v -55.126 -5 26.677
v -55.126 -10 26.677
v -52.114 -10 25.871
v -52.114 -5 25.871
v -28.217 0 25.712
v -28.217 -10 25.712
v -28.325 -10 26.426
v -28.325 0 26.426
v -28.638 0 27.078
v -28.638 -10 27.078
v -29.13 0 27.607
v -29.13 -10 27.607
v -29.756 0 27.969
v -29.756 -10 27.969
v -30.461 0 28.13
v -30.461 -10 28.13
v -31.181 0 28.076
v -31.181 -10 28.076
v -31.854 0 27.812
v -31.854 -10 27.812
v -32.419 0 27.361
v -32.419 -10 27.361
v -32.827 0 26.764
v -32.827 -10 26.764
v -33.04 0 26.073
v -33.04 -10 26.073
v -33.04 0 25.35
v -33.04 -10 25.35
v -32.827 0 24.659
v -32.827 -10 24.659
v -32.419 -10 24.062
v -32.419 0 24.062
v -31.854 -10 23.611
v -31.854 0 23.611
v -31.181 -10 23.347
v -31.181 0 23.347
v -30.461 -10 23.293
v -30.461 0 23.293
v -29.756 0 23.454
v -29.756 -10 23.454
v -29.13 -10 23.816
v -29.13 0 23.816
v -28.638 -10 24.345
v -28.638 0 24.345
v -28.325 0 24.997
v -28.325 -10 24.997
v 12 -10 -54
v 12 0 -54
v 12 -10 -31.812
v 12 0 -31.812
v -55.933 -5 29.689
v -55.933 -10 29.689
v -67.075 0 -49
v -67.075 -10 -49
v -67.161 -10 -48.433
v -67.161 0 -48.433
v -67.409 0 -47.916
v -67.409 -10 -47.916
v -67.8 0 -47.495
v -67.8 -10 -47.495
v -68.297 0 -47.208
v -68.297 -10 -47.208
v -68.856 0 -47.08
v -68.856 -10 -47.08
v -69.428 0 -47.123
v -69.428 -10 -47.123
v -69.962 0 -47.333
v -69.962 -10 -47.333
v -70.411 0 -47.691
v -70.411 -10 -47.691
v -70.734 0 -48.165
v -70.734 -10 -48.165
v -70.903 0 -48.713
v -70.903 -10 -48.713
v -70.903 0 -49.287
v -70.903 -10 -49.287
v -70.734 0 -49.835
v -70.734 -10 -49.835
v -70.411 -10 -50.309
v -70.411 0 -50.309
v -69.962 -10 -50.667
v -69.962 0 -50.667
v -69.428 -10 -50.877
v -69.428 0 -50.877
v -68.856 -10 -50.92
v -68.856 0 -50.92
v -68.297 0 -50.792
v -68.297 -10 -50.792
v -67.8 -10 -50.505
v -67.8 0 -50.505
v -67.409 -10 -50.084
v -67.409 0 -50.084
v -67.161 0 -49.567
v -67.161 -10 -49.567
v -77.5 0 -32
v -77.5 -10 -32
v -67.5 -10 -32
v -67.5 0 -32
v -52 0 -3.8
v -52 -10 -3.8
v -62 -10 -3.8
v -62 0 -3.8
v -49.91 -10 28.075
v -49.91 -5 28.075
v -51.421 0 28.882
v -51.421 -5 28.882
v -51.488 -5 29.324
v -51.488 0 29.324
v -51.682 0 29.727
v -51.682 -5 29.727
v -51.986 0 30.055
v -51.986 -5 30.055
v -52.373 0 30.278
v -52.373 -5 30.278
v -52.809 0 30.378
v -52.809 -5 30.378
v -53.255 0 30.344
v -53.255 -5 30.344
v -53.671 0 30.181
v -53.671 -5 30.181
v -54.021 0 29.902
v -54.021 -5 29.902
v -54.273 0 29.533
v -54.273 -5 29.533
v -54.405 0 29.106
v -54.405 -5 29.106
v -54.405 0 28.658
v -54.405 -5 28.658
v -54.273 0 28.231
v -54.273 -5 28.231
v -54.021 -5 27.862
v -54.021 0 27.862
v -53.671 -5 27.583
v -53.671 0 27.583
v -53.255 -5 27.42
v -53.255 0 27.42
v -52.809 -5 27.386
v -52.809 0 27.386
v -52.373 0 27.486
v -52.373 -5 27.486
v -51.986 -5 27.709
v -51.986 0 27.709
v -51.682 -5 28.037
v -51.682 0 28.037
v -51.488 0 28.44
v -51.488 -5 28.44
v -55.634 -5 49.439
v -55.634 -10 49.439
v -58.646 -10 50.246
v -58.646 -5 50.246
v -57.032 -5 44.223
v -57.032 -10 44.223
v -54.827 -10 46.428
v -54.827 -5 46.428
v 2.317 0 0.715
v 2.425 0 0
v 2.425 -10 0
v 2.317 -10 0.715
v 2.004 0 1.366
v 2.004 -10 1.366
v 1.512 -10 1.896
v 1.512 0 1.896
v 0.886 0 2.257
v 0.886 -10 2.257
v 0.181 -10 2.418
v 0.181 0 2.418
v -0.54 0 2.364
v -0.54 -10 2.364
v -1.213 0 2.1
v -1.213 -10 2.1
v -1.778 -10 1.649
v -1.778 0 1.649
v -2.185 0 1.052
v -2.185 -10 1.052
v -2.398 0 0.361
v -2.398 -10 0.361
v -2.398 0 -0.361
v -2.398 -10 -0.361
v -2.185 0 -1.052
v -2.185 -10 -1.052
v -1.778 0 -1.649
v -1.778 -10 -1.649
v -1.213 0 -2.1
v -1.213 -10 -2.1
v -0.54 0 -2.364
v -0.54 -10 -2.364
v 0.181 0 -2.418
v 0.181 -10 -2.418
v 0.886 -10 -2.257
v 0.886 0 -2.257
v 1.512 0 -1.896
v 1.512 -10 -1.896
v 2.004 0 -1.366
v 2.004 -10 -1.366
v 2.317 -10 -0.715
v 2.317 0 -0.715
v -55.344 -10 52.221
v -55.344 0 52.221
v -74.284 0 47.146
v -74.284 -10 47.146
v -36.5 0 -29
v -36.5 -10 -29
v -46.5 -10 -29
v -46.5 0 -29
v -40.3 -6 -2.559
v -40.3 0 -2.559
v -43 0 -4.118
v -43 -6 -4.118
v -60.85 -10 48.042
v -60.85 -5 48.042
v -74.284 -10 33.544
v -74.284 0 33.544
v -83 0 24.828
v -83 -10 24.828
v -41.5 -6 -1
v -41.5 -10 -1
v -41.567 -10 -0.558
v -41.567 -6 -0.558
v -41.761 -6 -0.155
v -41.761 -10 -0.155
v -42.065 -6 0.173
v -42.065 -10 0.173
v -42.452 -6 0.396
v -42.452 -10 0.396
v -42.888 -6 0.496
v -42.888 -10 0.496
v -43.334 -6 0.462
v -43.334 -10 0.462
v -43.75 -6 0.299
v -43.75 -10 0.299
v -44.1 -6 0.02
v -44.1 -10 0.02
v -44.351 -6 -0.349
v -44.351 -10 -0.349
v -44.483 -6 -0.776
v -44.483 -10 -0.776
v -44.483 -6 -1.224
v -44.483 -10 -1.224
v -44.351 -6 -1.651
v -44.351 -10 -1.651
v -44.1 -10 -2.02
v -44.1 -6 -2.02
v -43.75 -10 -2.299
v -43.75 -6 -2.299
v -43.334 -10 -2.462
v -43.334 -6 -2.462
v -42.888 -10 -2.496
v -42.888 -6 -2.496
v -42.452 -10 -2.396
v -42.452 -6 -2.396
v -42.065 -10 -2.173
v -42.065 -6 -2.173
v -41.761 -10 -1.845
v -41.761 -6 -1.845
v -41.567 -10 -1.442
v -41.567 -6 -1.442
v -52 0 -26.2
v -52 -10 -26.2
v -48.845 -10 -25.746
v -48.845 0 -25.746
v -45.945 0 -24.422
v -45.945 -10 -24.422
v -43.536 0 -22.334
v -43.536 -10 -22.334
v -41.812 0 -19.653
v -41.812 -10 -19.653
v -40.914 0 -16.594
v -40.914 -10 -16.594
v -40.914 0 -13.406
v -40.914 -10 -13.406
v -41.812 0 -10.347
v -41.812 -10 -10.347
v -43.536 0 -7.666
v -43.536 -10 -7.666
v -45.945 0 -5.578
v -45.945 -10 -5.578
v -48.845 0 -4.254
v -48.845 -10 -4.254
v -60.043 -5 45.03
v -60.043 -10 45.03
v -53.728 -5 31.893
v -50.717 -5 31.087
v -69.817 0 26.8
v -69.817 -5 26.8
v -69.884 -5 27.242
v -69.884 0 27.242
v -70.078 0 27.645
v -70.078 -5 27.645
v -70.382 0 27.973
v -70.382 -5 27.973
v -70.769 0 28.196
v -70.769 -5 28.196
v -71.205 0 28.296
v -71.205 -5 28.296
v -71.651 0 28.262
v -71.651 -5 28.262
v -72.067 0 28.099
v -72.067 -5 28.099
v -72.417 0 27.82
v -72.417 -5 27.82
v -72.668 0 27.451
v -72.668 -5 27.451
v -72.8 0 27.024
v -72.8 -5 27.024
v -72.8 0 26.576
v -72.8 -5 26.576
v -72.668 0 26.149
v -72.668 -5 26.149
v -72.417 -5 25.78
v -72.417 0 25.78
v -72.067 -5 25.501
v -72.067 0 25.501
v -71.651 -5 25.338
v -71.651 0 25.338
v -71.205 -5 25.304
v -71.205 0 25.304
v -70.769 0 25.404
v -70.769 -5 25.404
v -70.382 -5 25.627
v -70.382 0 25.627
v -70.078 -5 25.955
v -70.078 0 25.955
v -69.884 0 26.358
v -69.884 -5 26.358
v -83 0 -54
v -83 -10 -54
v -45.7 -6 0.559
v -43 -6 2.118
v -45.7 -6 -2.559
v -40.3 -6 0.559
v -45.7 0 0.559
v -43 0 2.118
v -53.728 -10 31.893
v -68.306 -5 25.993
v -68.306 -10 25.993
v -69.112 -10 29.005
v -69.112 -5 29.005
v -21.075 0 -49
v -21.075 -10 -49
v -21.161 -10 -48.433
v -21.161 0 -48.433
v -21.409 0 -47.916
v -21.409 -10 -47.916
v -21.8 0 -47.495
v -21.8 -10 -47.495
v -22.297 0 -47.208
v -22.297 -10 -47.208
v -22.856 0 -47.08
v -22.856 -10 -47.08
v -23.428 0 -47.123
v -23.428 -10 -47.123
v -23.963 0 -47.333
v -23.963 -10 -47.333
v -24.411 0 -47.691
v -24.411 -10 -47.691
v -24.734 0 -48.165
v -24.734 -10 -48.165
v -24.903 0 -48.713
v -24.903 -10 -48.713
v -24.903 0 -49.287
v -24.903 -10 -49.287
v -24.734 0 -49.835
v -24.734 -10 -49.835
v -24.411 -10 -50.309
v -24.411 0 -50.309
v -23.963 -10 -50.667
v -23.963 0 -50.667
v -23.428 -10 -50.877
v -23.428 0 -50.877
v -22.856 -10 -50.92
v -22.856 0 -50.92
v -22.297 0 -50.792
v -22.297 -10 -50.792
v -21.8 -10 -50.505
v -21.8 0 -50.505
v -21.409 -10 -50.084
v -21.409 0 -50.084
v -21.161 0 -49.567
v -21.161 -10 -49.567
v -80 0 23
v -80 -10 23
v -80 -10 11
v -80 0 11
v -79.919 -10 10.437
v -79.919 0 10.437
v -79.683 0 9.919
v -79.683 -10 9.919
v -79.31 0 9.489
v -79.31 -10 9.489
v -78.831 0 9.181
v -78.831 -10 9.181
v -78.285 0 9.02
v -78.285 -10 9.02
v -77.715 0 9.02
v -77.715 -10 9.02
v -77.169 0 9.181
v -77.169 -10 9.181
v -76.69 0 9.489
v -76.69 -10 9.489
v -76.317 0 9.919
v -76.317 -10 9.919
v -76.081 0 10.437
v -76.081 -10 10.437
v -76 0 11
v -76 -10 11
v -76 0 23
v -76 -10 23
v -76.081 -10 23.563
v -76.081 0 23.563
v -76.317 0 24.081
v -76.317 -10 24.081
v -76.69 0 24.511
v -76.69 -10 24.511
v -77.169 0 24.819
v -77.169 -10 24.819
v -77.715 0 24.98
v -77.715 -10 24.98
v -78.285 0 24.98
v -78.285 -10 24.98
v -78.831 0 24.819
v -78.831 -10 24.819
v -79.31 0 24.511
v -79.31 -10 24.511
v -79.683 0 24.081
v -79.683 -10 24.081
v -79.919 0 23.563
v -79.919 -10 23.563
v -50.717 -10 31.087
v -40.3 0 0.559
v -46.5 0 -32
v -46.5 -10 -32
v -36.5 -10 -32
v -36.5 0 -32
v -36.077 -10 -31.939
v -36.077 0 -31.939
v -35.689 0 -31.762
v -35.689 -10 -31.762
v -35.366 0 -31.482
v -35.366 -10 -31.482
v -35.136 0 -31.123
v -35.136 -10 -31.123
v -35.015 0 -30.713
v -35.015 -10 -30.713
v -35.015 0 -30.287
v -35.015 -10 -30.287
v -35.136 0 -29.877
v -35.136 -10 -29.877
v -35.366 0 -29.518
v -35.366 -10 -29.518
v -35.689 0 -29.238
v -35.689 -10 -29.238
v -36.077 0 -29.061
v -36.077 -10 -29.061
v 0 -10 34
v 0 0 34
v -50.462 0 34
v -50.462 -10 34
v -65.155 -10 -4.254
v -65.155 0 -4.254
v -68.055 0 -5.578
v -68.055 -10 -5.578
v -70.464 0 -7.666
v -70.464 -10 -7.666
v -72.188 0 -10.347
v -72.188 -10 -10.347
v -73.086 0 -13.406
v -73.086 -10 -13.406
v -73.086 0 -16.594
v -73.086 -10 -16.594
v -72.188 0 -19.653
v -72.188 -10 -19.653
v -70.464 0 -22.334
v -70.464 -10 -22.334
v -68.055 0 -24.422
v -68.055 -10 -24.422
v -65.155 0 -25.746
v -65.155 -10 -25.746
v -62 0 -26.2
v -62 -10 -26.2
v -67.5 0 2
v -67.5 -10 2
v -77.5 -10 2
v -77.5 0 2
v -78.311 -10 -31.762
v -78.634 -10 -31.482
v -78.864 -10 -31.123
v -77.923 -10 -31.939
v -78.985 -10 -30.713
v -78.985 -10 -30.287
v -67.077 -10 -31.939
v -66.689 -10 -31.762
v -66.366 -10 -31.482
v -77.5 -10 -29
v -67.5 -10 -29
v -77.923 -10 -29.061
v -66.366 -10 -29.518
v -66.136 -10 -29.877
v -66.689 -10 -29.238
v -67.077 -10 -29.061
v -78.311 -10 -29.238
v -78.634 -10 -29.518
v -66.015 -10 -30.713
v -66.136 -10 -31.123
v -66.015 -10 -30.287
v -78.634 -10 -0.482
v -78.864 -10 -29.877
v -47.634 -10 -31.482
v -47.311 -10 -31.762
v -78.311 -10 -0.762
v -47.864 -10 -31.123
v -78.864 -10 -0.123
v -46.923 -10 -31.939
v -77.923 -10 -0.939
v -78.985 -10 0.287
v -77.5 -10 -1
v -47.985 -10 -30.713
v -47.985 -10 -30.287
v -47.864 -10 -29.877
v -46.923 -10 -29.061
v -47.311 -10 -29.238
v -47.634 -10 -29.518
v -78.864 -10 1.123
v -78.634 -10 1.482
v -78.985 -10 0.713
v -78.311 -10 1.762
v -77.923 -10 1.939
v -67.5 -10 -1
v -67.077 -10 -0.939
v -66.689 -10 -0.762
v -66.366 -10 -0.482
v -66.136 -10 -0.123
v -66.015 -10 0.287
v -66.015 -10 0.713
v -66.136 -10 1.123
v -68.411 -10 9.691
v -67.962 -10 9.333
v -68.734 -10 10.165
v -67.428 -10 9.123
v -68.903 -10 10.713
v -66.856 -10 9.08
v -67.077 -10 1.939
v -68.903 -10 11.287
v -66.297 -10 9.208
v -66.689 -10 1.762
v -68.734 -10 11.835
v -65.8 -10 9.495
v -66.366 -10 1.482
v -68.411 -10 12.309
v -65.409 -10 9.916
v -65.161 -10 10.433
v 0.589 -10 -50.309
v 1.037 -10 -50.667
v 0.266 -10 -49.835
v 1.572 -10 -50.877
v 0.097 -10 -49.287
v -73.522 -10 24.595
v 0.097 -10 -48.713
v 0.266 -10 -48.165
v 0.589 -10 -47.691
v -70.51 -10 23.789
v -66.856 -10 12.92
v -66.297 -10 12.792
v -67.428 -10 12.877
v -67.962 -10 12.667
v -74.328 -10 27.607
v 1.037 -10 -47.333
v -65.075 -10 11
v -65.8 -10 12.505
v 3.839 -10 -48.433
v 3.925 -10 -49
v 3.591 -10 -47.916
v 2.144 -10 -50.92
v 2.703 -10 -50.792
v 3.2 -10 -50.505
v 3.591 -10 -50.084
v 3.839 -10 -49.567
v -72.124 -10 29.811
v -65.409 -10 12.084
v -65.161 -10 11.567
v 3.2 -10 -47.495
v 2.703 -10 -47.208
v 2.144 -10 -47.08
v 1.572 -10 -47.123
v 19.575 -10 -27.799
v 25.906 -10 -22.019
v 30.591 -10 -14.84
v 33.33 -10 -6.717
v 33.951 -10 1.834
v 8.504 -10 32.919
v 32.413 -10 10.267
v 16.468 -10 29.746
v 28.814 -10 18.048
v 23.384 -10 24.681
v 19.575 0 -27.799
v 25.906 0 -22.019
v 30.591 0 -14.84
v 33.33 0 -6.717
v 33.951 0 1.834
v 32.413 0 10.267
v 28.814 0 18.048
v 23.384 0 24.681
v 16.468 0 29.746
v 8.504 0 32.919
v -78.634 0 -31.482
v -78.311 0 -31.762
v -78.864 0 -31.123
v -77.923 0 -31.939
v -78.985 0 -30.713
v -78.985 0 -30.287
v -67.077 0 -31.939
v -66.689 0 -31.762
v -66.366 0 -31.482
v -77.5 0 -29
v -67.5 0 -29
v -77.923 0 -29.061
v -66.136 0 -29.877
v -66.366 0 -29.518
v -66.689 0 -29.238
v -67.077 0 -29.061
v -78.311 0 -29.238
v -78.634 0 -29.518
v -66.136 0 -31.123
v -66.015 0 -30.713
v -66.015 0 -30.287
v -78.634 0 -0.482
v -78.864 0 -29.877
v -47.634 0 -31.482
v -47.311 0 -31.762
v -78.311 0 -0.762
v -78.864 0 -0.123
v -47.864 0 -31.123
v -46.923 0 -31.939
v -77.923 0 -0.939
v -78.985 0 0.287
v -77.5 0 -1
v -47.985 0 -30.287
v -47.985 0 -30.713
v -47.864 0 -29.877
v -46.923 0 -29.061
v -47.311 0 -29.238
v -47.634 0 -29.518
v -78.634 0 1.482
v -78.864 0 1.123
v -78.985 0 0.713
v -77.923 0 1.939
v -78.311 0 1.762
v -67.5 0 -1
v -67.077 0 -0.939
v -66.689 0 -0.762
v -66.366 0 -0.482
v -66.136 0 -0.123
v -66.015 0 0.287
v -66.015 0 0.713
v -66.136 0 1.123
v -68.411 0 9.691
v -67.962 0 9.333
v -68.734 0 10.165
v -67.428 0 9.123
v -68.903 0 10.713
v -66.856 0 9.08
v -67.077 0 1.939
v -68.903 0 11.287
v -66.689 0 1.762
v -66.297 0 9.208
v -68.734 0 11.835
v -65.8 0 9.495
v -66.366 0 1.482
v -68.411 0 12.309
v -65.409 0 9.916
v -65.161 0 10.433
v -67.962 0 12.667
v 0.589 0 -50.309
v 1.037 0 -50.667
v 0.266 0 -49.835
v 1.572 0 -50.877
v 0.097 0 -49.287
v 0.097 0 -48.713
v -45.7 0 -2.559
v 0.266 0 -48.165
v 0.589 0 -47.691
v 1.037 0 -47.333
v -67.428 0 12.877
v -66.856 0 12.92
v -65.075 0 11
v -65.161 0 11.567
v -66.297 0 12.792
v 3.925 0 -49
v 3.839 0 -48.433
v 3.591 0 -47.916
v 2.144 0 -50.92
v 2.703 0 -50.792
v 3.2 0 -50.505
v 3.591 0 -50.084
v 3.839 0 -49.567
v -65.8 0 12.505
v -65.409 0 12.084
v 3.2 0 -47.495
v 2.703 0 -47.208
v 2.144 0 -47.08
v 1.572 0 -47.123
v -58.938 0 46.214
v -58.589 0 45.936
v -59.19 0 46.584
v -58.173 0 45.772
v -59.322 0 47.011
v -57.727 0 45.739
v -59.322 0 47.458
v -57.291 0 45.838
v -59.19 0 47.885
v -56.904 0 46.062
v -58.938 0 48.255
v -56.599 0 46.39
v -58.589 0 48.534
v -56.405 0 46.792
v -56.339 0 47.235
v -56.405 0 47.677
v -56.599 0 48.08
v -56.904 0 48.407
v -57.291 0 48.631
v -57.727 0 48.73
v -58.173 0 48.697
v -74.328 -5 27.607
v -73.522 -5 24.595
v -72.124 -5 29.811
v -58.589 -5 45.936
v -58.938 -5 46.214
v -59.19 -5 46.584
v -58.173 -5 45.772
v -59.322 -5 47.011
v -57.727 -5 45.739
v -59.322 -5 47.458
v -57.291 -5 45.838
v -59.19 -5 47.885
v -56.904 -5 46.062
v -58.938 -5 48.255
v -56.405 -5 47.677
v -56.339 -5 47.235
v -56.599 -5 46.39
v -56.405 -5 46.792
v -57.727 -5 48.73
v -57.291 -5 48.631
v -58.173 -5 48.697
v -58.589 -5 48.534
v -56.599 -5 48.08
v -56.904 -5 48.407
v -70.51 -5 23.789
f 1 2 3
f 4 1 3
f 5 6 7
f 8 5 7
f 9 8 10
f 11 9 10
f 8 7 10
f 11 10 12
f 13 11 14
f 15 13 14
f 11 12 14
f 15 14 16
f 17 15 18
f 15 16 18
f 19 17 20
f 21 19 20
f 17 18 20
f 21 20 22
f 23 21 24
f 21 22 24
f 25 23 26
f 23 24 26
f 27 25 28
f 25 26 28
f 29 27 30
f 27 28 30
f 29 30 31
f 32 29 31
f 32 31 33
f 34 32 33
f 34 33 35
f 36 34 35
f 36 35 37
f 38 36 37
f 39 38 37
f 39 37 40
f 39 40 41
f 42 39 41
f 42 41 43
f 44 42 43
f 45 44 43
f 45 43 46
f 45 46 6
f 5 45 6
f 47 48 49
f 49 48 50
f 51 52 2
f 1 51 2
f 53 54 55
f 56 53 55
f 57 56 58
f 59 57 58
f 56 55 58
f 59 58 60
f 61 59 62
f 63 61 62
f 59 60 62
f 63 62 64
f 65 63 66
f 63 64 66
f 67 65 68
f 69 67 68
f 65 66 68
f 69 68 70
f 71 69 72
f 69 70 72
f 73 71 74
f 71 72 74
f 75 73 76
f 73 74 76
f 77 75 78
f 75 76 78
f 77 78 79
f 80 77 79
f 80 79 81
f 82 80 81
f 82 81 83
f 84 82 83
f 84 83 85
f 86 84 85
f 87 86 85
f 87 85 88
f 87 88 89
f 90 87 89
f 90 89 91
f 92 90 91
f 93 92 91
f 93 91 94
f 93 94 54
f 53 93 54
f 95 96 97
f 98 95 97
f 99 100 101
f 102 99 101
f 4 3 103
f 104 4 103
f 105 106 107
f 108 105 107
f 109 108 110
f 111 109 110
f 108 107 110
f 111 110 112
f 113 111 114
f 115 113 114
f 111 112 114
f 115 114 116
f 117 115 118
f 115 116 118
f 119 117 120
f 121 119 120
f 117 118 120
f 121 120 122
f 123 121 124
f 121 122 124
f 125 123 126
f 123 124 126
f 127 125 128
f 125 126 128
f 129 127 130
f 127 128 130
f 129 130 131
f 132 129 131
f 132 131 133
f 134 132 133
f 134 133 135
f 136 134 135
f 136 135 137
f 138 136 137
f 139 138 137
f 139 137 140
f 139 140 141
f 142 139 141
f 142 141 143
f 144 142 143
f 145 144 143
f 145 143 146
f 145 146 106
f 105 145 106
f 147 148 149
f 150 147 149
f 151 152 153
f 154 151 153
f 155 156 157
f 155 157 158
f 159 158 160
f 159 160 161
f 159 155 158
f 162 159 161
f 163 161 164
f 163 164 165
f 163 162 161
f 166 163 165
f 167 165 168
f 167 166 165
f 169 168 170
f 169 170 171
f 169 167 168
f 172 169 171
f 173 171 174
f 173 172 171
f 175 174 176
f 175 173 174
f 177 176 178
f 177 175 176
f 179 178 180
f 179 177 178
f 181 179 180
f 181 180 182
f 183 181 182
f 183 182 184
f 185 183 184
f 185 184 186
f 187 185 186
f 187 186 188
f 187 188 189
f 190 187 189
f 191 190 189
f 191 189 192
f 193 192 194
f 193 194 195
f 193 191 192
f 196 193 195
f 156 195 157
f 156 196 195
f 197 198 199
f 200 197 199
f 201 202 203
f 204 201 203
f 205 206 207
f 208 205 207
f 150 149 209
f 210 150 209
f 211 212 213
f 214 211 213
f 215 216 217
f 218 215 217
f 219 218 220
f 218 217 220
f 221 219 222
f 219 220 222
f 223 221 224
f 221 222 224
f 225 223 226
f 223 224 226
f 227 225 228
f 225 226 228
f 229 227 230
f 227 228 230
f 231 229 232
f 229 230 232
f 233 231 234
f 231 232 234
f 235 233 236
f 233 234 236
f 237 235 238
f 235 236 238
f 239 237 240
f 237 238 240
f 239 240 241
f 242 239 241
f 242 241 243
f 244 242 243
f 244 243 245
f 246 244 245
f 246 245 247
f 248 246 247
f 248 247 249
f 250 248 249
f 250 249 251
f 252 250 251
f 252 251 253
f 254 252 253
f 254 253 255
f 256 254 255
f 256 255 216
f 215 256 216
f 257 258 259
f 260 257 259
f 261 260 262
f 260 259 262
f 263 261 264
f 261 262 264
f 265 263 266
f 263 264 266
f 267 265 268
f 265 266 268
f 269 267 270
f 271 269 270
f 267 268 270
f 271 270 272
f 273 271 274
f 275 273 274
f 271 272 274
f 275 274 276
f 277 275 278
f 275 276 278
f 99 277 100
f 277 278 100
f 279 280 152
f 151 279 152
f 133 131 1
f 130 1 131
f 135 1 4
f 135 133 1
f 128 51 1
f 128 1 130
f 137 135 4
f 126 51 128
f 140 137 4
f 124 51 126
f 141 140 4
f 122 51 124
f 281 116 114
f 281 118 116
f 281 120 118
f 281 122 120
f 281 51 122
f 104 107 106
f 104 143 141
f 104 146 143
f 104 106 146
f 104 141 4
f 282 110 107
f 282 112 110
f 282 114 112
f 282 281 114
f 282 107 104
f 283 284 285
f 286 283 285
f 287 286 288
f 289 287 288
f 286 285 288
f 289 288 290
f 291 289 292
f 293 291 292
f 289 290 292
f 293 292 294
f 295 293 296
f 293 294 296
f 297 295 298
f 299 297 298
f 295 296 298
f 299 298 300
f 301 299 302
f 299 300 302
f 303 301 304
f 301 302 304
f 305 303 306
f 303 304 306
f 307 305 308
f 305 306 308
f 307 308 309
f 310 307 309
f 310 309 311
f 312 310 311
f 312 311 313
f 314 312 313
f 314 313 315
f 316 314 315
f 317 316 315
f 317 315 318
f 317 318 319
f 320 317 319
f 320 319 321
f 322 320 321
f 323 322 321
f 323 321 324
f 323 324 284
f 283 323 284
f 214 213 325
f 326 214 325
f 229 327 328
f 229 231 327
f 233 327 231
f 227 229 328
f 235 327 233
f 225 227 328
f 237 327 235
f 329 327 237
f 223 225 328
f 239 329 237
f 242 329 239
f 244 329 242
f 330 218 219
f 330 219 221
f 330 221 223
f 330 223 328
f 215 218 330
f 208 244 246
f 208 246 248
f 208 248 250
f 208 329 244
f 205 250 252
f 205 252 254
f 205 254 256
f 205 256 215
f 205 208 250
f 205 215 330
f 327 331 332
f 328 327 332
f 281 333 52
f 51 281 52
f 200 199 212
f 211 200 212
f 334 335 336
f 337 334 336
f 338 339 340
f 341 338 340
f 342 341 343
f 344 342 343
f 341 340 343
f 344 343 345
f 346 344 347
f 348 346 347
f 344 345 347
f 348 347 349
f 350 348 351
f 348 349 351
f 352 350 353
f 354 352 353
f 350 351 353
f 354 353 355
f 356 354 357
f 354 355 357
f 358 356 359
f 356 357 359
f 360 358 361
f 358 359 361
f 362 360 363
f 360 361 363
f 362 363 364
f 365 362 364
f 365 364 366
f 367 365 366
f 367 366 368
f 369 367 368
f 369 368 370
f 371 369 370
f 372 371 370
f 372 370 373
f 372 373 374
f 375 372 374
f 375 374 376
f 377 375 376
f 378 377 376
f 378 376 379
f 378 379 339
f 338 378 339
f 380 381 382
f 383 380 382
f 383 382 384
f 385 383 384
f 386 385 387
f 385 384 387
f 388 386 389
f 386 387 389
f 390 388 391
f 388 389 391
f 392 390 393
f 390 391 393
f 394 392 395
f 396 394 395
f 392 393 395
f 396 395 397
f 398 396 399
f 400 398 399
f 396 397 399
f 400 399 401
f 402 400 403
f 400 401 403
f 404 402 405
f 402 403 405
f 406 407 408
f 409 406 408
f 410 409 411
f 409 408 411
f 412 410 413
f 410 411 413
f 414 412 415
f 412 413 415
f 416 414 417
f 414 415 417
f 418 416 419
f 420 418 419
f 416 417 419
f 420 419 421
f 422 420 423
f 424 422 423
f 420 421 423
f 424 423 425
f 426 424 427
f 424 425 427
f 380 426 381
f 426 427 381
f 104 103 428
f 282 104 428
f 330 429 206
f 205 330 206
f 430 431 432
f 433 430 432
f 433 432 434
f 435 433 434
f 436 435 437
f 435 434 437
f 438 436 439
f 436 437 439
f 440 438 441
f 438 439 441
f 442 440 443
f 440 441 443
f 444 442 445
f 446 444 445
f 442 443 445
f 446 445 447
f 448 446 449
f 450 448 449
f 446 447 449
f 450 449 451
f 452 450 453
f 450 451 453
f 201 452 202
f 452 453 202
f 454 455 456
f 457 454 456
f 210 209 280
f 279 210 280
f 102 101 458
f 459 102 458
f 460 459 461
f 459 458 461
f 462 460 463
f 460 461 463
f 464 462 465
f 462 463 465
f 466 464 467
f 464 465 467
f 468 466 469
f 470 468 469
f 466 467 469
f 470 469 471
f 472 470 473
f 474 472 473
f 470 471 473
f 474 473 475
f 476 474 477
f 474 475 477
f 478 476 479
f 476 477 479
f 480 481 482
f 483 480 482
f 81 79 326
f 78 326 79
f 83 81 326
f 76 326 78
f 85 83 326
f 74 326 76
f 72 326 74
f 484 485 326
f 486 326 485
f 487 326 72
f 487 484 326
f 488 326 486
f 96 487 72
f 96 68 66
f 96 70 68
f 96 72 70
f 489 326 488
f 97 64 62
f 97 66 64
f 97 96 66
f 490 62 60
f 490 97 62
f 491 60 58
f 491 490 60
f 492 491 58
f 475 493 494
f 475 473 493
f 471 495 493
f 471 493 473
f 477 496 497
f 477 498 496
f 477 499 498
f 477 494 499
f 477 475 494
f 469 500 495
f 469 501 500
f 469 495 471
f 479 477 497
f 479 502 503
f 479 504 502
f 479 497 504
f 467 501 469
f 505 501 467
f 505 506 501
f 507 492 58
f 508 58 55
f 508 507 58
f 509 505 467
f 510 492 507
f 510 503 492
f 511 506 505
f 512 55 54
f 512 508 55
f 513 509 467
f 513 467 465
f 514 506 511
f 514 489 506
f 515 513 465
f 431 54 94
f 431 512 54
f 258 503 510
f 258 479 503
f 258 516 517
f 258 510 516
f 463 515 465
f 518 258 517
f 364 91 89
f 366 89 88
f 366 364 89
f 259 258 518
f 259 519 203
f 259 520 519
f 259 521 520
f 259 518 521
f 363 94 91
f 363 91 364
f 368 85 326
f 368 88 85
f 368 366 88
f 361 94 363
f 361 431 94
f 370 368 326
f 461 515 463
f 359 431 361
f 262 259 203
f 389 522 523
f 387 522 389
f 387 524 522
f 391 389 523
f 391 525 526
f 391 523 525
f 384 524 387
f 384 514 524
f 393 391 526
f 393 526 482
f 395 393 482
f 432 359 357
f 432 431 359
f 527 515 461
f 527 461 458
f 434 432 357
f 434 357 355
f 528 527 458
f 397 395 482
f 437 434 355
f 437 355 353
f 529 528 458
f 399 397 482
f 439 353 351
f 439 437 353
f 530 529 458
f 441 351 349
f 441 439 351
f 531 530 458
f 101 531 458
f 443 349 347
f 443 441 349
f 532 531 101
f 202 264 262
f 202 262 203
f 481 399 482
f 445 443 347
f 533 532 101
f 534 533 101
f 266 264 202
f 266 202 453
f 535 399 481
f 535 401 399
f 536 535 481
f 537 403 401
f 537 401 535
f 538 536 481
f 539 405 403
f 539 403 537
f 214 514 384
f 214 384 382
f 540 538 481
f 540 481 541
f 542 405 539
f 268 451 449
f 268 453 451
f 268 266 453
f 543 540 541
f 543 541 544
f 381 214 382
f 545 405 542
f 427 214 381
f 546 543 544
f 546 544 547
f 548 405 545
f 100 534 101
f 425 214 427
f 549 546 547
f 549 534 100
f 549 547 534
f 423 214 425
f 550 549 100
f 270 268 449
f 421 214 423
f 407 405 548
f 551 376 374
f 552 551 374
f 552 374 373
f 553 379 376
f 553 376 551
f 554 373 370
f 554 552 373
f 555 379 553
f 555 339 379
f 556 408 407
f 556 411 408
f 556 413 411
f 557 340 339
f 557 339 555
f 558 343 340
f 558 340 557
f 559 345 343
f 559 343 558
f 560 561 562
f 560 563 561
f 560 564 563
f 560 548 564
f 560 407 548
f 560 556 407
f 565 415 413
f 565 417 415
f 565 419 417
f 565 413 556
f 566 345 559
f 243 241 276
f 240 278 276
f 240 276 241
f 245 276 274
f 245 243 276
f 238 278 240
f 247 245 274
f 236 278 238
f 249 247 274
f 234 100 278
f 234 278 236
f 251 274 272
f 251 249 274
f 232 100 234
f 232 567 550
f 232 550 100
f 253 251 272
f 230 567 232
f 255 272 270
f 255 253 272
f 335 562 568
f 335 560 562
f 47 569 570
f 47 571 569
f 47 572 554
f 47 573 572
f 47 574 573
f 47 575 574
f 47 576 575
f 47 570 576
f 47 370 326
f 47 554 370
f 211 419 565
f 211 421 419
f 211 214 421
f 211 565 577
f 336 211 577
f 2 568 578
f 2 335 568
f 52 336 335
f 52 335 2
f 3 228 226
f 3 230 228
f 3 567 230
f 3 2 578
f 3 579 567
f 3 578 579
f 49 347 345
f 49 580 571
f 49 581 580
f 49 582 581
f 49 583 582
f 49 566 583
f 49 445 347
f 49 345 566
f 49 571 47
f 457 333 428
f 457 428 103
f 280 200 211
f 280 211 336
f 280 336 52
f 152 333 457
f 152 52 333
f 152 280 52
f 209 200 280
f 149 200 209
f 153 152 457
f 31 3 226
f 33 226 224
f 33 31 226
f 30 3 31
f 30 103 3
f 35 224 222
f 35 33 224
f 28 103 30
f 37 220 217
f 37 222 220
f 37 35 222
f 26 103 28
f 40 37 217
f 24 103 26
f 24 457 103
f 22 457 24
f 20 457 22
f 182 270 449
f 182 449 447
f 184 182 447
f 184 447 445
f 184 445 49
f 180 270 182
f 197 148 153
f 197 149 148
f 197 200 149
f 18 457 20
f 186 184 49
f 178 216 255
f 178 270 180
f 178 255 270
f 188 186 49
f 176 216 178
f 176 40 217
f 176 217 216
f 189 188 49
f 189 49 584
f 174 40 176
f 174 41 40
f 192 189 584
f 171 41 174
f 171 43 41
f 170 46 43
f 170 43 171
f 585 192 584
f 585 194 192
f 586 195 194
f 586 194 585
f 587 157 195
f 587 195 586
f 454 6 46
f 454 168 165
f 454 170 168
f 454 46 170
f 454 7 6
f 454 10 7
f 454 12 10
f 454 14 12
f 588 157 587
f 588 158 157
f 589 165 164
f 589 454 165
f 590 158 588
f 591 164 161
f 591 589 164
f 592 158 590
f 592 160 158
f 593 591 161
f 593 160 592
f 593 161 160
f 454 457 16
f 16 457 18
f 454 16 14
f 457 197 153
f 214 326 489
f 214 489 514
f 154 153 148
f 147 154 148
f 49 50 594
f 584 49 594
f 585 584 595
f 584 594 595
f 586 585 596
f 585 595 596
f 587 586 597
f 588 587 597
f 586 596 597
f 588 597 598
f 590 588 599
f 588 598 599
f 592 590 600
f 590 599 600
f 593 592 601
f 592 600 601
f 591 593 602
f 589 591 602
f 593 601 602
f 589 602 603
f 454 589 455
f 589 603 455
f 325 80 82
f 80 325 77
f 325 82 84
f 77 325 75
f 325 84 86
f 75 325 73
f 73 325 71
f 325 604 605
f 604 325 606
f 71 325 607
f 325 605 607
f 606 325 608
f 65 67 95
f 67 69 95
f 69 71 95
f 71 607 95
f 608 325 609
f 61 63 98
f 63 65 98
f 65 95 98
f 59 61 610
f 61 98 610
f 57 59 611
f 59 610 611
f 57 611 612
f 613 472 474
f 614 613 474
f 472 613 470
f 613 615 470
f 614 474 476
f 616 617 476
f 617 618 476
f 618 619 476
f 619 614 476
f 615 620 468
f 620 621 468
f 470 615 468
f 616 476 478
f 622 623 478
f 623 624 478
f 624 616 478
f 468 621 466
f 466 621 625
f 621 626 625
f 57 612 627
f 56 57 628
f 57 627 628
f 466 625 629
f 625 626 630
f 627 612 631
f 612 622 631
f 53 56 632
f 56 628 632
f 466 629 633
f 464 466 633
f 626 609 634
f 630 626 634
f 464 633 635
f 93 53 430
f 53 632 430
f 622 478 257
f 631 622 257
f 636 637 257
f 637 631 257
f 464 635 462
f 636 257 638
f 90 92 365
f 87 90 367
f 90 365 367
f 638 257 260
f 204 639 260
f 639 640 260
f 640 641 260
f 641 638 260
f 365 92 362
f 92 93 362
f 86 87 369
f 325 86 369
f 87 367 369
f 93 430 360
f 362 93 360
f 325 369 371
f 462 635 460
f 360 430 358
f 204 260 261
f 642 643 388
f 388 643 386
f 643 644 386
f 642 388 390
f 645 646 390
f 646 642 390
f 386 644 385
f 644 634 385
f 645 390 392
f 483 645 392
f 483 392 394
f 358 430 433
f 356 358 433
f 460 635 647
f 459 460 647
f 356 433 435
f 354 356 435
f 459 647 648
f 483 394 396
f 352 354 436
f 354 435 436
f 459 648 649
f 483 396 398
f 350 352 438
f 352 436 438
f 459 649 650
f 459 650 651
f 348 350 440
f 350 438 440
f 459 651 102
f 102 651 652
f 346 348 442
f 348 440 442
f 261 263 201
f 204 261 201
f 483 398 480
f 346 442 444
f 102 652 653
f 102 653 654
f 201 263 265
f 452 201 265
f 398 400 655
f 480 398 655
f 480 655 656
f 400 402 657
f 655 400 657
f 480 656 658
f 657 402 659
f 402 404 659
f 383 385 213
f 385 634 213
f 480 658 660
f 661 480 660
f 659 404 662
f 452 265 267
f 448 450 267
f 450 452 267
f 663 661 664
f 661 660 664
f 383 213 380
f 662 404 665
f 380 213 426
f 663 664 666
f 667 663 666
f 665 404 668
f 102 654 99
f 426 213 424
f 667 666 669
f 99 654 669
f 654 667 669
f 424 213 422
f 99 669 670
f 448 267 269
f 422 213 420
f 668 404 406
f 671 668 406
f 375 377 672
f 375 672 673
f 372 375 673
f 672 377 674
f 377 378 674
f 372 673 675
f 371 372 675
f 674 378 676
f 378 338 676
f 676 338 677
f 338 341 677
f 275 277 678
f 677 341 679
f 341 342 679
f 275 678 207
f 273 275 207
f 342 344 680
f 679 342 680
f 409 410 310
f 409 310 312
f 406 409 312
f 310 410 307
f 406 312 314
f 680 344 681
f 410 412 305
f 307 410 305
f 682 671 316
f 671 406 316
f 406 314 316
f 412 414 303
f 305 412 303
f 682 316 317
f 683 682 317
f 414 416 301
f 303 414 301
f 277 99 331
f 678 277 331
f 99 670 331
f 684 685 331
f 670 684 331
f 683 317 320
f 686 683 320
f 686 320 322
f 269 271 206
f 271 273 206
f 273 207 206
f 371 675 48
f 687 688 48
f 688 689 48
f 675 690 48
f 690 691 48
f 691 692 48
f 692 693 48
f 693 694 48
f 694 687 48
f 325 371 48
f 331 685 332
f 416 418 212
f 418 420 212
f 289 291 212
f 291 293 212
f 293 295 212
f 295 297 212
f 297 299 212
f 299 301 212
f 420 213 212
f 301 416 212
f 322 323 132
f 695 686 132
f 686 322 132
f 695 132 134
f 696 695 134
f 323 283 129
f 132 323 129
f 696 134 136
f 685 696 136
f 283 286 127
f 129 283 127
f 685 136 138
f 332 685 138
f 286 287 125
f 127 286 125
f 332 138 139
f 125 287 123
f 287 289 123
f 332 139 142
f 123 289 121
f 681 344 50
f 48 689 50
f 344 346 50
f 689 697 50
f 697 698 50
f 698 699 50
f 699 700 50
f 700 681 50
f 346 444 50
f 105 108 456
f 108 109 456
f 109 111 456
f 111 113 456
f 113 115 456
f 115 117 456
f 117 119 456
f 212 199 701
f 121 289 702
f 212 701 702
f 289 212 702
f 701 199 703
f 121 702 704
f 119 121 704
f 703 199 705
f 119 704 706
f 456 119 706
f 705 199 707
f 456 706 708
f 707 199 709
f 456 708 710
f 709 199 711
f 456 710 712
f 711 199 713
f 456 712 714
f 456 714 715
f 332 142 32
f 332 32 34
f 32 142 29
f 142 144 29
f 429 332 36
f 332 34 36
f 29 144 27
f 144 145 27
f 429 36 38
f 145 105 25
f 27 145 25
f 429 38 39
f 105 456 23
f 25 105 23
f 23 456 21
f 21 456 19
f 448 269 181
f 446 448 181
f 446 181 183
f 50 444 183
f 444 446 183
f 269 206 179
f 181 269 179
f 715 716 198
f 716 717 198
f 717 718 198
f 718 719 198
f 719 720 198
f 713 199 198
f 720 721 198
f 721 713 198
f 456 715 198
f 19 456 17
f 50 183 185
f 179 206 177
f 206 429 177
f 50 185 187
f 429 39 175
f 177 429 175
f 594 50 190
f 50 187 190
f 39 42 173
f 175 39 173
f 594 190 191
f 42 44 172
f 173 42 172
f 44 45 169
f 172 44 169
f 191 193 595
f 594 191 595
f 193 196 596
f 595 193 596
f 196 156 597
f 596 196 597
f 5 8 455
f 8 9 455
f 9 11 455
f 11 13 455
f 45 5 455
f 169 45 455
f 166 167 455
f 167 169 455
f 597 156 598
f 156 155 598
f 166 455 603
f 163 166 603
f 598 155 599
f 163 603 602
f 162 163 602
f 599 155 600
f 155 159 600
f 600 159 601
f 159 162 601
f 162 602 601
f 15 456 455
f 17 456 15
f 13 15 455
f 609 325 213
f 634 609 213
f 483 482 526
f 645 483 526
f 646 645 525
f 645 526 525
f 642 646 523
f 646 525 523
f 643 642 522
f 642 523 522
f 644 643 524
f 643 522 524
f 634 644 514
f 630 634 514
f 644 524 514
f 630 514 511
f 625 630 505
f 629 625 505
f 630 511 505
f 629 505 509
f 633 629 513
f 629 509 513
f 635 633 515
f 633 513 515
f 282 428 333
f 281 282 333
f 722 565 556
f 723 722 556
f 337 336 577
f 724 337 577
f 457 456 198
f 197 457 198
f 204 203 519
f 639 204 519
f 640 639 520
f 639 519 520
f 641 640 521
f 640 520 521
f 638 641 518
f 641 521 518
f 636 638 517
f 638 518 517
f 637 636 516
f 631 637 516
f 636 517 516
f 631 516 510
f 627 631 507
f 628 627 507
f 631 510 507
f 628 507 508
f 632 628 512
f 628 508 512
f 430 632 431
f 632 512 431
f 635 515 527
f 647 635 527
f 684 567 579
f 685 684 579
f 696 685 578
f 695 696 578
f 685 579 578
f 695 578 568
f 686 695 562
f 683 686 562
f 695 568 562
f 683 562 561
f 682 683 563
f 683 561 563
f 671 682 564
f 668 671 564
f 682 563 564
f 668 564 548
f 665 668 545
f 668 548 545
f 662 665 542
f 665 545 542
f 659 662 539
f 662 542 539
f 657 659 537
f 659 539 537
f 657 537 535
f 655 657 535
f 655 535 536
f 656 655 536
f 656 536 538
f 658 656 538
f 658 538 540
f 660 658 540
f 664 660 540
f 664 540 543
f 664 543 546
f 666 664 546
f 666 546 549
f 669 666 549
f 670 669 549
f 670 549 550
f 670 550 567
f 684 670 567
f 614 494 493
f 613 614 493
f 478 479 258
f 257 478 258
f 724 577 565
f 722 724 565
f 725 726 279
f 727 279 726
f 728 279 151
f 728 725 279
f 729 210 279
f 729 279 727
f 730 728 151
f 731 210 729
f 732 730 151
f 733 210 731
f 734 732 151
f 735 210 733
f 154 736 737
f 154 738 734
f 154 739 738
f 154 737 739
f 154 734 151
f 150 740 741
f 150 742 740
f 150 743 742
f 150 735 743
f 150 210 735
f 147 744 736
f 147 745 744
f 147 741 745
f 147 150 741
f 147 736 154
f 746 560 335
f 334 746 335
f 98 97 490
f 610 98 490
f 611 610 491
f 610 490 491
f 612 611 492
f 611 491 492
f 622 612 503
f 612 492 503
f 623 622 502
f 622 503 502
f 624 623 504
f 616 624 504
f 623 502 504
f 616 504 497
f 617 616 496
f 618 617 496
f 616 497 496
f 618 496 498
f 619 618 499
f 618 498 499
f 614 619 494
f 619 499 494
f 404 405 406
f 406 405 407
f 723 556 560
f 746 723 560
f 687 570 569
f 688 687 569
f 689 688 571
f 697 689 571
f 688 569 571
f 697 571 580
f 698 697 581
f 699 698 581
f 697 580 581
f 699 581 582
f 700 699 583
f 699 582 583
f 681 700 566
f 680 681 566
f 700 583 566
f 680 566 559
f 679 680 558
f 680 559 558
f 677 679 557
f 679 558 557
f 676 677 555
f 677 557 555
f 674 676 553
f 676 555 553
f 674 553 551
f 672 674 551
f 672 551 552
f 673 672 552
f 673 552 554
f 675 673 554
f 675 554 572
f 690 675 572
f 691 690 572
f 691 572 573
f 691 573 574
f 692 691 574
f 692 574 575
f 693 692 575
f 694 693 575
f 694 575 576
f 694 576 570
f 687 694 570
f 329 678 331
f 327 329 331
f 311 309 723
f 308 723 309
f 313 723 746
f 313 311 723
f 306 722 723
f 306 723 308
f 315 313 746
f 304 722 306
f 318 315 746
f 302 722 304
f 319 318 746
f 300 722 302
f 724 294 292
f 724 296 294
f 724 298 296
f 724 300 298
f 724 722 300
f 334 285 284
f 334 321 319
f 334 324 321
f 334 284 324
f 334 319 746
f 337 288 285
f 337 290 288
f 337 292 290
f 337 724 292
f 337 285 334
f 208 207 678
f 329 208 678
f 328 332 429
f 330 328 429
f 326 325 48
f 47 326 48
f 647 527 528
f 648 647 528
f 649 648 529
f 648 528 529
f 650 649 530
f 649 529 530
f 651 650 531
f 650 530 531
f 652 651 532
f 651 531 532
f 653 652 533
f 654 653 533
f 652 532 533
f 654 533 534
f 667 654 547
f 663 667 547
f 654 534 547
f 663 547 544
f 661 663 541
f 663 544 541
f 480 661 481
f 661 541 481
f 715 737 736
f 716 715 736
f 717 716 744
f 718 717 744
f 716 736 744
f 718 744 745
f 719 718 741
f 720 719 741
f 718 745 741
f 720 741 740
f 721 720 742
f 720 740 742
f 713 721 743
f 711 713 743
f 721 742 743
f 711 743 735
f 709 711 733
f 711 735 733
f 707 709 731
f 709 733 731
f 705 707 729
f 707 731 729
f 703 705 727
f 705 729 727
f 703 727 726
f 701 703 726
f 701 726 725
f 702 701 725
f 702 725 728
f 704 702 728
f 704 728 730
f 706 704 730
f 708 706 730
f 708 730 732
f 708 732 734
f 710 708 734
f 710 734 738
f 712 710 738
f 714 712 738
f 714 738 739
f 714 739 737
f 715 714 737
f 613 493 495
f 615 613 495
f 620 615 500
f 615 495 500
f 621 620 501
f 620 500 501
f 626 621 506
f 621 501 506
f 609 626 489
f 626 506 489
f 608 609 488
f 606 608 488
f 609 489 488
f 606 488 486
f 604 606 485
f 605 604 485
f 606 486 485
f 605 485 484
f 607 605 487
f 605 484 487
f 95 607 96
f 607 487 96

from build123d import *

# Parameters (mm, degrees)
SKETCH_R        = 2.425
PAD_DEPTH       = 10
SKETCH001_R     = 1.925
POCKET_DEPTH    = 12
SKETCH002_R     = 1.5
POCKET001_DEPTH = 12
SKETCH003_R     = 1.925
POCKET002_DEPTH = 12
SKETCH004_R     = 2.425
POCKET003_DEPTH = 12
SKETCH005_R     = 1.5
POCKET004_DEPTH = 12
POCKET005_DEPTH = 5
POCKET006_DEPTH = 12
POCKET007_DEPTH = 6


with BuildPart() as part:
    # Sketch → Pad (new body)
    with BuildSketch(Plane.XZ):
        with BuildLine():
            ThreePointArc((12, -31.811947), (33.448514, 6.098926), (0, 34))
            Line((0, 34), (-50.4621, 34))
            Line((-50.4621, 34), (-55.344463, 52.221225))
            Line((-55.344463, 52.221225), (-74.284202, 47.145798))
            Line((-74.284202, 47.145798), (-74.284202, 33.543798))
            Line((-74.284202, 33.543798), (-83, 24.828))
            Line((-83, 24.828), (-83, -54))
            Line((-83, -54), (12, -54))
            Line((12, -54), (12, -31.811947))
        make_face()
        Circle(SKETCH_R, mode=Mode.SUBTRACT)
    extrude(amount=PAD_DEPTH)

    # Sketch001 (on Face12 of Pad) → Pocket (cut)
    with BuildSketch(Plane.XZ.offset(10)):
        with Locations((-69, -49)):
            Circle(SKETCH001_R)
        with Locations((-23, -49)):
            Circle(SKETCH001_R)
        with Locations((2, -49)):
            Circle(SKETCH001_R)
    extrude(amount=-POCKET_DEPTH, mode=Mode.SUBTRACT)

    # Sketch002 (on Face5 of Pocket) → Pocket001 (cut)
    with BuildSketch(Plane.XZ.offset(10)):
        with Locations((-43, -1)):
            Circle(SKETCH002_R)
        with BuildLine():
            ThreePointArc((-62, -3.8), (-73.2, -15), (-62, -26.2))
            Line((-62, -26.2), (-52, -26.2))
            ThreePointArc((-52, -26.2), (-40.8, -15), (-52, -3.8))
            Line((-52, -3.8), (-62, -3.8))
        make_face()
        with BuildLine():
            ThreePointArc((-77.5, -29), (-79, -30.5), (-77.5, -32))
            Line((-77.5, -32), (-67.5, -32))
            ThreePointArc((-67.5, -32), (-66, -30.5), (-67.5, -29))
            Line((-67.5, -29), (-77.5, -29))
        make_face()
        with BuildLine():
            ThreePointArc((-46.5, -29), (-48, -30.5), (-46.5, -32))
            Line((-46.5, -32), (-36.5, -32))
            ThreePointArc((-36.5, -32), (-35, -30.5), (-36.5, -29))
            Line((-36.5, -29), (-46.5, -29))
        make_face()
        with BuildLine():
            ThreePointArc((-77.5, 2), (-79, 0.5), (-77.5, -1))
            Line((-77.5, -1), (-67.5, -1))
            ThreePointArc((-67.5, -1), (-66, 0.5), (-67.5, 2))
            Line((-67.5, 2), (-77.5, 2))
        make_face()
    extrude(amount=-POCKET001_DEPTH, mode=Mode.SUBTRACT)

    # Sketch003 (on Face5 of Pocket001) → Pocket002 (cut)
    with BuildSketch(Plane.XZ.offset(10)):
        with Locations((-67, 11)):
            Circle(SKETCH003_R)
    extrude(amount=-POCKET002_DEPTH, mode=Mode.SUBTRACT)

    # Sketch004 (on Face5 of Pocket002) → Pocket003 (cut)
    with BuildSketch(Plane.XZ.offset(10)):
        with Locations((-30.641778, 25.711504)):
            Circle(SKETCH004_R)
    extrude(amount=-POCKET003_DEPTH, mode=Mode.SUBTRACT)

    # Sketch005 (on Face5 of Pocket003) → Pocket004 (cut)
    with BuildSketch(Plane.XZ.offset(10)):
        with Locations((-57.838829, 47.234623)):
            Circle(SKETCH005_R)
        with Locations((-52.921267, 28.882032)):
            Circle(SKETCH005_R)
        with Locations((-71.317, 26.8)):
            Circle(SKETCH005_R)
    extrude(amount=-POCKET004_DEPTH, mode=Mode.SUBTRACT)

    # Sketch006 (on Face5 of Pocket004) → Pocket005 (cut)
    with BuildSketch(Plane.XZ.offset(10)):
        Polygon((-54.82737, 46.427705), (-55.634288, 49.439164), (-58.645747, 50.246082), (-60.850288, 48.041541), (-60.04337, 45.030082), (-57.031911, 44.223164), align=None)
        Polygon((-50.716726, 31.086573), (-53.728185, 31.893491), (-55.932726, 29.68895), (-55.125808, 26.677491), (-52.114349, 25.870573), (-49.909808, 28.075114), align=None)
        Polygon((-73.521541, 24.595459), (-70.510082, 23.788541), (-68.305541, 25.993082), (-69.112459, 29.004541), (-72.123918, 29.811459), (-74.328459, 27.606918), align=None)
    extrude(amount=-POCKET005_DEPTH, mode=Mode.SUBTRACT)

    # Sketch007 (on Face5 of Pocket005) → Pocket006 (cut)
    with BuildSketch(Plane.XZ.offset(10)):
        with BuildLine():
            ThreePointArc((-76, 23), (-78, 25), (-80, 23))
            Line((-80, 23), (-80, 11))
            ThreePointArc((-80, 11), (-78, 9), (-76, 11))
            Line((-76, 11), (-76, 23))
        make_face()
    extrude(amount=-POCKET006_DEPTH, mode=Mode.SUBTRACT)

    # Sketch008 (on Face4 of Pocket006) → Pocket007 (cut)
    with BuildSketch(Plane(origin=(0, 0, 0), x_dir=(1, 0, 0), z_dir=(0, 1, 0))):
        Polygon((-40.3, -0.558846), (-40.3, 2.558846), (-43, 4.117691), (-45.7, 2.558846), (-45.7, -0.558846), (-43, -2.117691), align=None)
    extrude(amount=-POCKET007_DEPTH, mode=Mode.SUBTRACT)


solid = part.part
